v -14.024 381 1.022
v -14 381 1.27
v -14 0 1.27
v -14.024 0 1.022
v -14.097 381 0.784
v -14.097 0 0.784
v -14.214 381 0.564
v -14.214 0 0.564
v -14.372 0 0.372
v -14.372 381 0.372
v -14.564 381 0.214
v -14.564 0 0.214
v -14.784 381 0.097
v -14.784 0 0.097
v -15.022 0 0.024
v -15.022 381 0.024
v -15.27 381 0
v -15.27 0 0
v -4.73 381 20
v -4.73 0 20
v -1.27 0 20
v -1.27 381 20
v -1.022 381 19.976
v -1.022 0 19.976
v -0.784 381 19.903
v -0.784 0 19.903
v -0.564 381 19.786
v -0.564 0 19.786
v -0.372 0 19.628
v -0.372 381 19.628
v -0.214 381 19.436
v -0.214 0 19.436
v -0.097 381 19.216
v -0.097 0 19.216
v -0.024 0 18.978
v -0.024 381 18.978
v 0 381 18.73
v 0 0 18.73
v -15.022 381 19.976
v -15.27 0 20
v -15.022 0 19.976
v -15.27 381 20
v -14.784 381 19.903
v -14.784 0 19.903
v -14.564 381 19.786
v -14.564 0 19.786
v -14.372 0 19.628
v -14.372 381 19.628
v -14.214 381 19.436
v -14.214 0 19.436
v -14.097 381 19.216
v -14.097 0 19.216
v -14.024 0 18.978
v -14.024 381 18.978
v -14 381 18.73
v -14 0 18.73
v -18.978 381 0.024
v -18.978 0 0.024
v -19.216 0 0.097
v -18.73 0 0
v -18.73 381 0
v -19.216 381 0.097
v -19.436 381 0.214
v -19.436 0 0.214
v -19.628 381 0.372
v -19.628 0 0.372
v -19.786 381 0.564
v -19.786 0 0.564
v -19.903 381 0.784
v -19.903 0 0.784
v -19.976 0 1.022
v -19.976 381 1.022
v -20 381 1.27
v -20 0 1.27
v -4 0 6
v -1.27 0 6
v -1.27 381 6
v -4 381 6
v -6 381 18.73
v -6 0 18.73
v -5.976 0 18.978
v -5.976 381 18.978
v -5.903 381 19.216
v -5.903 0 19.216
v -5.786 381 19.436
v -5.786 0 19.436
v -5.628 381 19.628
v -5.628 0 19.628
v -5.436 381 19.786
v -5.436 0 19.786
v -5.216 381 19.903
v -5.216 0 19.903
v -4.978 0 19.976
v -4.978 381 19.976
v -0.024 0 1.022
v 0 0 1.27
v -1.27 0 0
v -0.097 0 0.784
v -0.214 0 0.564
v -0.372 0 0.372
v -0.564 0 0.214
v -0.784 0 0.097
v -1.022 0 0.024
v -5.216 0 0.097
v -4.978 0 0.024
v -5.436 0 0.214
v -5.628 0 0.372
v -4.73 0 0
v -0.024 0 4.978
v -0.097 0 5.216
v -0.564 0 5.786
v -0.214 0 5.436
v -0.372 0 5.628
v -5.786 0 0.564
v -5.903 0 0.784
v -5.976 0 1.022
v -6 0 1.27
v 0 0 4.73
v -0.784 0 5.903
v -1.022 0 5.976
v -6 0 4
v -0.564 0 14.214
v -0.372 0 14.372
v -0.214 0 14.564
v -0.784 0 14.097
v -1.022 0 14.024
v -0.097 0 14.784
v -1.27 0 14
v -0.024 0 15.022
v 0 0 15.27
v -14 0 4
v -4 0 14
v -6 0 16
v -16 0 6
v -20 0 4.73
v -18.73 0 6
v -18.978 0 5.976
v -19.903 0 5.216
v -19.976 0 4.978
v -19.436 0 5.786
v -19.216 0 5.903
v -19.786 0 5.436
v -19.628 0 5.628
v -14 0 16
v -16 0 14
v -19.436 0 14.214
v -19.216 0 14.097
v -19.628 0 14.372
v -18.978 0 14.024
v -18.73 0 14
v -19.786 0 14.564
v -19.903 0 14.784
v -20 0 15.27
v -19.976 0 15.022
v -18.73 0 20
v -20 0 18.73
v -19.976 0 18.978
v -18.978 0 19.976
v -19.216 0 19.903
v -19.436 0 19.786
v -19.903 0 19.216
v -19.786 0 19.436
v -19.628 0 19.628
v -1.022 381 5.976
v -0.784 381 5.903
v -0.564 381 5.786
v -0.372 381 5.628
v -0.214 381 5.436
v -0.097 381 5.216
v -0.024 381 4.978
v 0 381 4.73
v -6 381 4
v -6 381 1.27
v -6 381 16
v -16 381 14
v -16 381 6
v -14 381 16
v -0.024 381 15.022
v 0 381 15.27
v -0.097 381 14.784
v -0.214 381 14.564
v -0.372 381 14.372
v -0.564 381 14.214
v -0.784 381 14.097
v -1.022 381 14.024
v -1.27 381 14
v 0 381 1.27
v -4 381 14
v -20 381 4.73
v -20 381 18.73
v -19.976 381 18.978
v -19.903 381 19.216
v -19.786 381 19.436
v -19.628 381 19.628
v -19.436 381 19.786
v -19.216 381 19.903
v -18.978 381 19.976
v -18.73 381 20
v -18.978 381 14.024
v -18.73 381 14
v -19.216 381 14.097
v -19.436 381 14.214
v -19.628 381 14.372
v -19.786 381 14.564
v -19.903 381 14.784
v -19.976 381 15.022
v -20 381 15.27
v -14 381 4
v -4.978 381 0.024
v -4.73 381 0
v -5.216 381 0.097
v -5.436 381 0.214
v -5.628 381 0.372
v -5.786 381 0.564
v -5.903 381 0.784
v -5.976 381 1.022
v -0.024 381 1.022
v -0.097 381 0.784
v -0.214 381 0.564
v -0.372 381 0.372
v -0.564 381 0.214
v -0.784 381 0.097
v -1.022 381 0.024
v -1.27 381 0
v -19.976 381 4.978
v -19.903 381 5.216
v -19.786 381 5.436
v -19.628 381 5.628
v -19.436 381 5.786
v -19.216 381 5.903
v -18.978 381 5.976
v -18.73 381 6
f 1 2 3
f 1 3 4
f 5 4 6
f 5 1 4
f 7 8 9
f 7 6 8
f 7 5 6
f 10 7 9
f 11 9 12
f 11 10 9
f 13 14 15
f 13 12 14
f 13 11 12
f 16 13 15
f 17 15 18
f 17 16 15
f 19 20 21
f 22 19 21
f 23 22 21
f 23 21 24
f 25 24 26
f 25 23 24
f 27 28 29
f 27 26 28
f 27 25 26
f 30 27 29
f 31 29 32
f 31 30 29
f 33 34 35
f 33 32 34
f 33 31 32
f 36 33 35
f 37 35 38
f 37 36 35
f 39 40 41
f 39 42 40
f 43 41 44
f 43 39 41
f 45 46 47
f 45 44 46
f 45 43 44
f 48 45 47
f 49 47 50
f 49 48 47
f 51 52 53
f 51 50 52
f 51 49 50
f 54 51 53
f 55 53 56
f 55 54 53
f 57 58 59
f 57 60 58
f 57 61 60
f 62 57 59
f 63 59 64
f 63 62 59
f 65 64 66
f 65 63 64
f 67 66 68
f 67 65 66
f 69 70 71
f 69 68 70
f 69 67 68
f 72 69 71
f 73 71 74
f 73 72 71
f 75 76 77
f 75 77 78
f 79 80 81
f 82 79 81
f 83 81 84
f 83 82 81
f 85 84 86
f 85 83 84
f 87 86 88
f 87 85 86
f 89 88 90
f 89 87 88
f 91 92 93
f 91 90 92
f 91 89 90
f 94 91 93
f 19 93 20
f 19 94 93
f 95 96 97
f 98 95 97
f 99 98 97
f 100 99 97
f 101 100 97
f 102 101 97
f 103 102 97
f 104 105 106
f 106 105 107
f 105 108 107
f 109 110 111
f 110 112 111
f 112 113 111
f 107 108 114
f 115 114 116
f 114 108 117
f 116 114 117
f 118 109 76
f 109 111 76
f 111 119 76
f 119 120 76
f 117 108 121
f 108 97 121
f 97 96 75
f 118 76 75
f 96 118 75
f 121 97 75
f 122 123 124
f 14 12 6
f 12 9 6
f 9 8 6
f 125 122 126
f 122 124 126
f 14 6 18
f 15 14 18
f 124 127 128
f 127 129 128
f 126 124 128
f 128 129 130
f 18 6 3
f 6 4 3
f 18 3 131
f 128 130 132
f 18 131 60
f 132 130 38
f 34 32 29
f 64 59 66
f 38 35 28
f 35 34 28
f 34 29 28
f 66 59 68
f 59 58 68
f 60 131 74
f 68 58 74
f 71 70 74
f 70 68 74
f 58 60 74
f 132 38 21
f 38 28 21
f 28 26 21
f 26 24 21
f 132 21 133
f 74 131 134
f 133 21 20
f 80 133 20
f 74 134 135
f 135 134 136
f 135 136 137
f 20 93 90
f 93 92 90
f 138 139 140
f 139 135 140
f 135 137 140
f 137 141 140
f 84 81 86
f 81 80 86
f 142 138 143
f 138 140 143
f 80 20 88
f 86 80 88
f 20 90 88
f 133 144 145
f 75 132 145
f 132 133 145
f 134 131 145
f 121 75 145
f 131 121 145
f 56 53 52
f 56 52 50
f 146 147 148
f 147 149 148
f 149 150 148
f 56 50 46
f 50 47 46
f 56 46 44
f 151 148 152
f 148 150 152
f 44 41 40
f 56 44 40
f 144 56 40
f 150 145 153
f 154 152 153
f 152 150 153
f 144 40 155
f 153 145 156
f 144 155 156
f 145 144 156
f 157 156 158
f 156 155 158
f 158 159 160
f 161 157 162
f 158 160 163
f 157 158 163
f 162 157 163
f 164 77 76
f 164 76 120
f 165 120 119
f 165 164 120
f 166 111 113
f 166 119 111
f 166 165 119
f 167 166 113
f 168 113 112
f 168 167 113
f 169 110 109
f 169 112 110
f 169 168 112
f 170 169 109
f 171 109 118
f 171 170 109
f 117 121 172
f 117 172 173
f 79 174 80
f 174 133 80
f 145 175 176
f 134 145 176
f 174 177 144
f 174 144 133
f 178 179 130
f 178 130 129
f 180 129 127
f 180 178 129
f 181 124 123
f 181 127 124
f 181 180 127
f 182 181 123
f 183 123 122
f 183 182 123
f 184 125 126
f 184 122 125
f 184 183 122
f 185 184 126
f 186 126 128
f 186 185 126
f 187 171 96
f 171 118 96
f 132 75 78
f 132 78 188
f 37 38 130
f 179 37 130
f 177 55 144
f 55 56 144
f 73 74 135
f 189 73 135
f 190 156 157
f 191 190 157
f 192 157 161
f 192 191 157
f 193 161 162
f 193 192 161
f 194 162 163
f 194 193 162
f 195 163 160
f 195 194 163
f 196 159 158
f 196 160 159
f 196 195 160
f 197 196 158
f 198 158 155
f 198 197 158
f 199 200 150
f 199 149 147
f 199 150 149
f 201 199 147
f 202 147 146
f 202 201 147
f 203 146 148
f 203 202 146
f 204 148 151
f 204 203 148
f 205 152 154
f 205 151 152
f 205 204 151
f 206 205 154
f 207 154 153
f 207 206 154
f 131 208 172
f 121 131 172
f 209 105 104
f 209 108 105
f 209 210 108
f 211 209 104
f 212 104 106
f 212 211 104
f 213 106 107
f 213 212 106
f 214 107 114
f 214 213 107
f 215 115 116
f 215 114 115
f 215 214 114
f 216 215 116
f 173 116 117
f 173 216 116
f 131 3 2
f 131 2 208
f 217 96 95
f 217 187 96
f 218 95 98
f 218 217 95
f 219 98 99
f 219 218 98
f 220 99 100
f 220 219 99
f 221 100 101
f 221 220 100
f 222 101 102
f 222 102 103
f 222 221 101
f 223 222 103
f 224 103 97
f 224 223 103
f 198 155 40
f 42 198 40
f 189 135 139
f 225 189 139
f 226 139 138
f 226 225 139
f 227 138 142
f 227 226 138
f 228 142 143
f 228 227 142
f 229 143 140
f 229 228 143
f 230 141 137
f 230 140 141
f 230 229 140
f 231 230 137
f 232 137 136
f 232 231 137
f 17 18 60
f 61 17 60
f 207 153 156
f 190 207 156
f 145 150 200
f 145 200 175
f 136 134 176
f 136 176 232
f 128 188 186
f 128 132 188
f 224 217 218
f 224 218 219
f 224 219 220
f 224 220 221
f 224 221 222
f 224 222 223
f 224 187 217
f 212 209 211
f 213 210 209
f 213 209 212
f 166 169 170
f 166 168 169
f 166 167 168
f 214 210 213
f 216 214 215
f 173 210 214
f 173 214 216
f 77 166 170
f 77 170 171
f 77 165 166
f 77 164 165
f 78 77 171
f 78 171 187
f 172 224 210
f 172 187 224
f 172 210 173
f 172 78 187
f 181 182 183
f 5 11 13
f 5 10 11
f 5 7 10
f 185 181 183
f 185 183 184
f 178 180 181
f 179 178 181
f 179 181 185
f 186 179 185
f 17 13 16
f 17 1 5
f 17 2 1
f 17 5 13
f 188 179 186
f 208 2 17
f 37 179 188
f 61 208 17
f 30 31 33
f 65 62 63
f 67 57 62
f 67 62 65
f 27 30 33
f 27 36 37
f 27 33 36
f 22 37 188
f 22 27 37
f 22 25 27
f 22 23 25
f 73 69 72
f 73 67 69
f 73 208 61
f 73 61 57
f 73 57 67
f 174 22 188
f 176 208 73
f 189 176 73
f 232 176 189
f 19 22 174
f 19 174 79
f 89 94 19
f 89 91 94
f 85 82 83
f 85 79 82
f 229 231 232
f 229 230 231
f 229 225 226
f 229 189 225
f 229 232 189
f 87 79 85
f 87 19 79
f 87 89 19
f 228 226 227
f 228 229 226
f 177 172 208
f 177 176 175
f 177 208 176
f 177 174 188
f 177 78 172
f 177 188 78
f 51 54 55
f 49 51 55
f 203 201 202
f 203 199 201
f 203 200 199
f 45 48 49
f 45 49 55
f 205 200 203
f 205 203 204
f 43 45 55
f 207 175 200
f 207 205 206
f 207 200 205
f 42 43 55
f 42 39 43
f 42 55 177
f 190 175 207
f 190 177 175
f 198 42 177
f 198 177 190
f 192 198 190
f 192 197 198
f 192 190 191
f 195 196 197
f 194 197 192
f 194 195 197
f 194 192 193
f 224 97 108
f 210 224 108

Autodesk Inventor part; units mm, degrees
ref_plane "YZ Plane" through (0, 0, 0) normal (1, 0, 0) x (0, 1, 0)
ref_plane "XZ Plane" through (0, 0, 0) normal (0, 1, 0) x (-1, 0, 0)
ref_plane "XY Plane" through (0, 0, 0) normal (0, 0, 1) x (1, 0, 0)
sketch "Sketch1" plane through (0, 0, 0) normal (0, 1, 0) x (-1, 0, 0)
  line L0 (0, 0) -> (20, 0)
  line L1 (20, 0) -> (20, 20)
  line L2 (20, 20) -> (0, 20)
  line L3 (0, 20) -> (0, 0)
  line L4 (6, 0) -> (14, 0)
  line L5 (14, 0) -> (14, 4)
  line L6 (14, 4) -> (6, 4)
  line L7 (6, 4) -> (6, 0)
  line L8 (0, 6) -> (4, 6)
  line L9 (4, 6) -> (4, 14)
  line L10 (4, 14) -> (0, 14)
  line L11 (0, 14) -> (0, 6)
  line L12 (6, 20) -> (14, 20)
  line L13 (14, 20) -> (14, 16)
  line L14 (14, 16) -> (6, 16)
  line L15 (6, 16) -> (6, 20)
  line L16 (20, 14) -> (16, 14)
  line L17 (16, 14) -> (16, 6)
  line L18 (16, 6) -> (20, 6)
  line L19 (20, 6) -> (20, 14)
  dimension "d0" = 20
  dimension "d1" = 20
  dimension "d2" = 8
  dimension "d3" = 6
  dimension "d4" = 8
  dimension "d5" = 6
  dimension "d6" = 4
  dimension "d7" = 4
  dimension "d8" = 4
  dimension "d9" = 4
extrude "Extrusion1" add sketch "Sketch1" along normal blind 381 contours L3 L8 L9 L10 L2 L15 L14 L13 L1 L16 L17 L18 L0 L5 L6 L7
fillet "Fillet1" radius 1.27 12 edges at (0, 190.5, 20) (0, 190.5, 14) (-6, 190.5, 20) (-14, 190.5, 20) (-20, 190.5, 20) (-20, 190.5, 14) (0, 190.5, 6) (0, 190.5, 0) (-6, 190.5, 0) (-14, 190.5, 0) (-20, 190.5, 0) (-20, 190.5, 6)
properties part number "20x20extrusion" material "Aluminum 6061"
